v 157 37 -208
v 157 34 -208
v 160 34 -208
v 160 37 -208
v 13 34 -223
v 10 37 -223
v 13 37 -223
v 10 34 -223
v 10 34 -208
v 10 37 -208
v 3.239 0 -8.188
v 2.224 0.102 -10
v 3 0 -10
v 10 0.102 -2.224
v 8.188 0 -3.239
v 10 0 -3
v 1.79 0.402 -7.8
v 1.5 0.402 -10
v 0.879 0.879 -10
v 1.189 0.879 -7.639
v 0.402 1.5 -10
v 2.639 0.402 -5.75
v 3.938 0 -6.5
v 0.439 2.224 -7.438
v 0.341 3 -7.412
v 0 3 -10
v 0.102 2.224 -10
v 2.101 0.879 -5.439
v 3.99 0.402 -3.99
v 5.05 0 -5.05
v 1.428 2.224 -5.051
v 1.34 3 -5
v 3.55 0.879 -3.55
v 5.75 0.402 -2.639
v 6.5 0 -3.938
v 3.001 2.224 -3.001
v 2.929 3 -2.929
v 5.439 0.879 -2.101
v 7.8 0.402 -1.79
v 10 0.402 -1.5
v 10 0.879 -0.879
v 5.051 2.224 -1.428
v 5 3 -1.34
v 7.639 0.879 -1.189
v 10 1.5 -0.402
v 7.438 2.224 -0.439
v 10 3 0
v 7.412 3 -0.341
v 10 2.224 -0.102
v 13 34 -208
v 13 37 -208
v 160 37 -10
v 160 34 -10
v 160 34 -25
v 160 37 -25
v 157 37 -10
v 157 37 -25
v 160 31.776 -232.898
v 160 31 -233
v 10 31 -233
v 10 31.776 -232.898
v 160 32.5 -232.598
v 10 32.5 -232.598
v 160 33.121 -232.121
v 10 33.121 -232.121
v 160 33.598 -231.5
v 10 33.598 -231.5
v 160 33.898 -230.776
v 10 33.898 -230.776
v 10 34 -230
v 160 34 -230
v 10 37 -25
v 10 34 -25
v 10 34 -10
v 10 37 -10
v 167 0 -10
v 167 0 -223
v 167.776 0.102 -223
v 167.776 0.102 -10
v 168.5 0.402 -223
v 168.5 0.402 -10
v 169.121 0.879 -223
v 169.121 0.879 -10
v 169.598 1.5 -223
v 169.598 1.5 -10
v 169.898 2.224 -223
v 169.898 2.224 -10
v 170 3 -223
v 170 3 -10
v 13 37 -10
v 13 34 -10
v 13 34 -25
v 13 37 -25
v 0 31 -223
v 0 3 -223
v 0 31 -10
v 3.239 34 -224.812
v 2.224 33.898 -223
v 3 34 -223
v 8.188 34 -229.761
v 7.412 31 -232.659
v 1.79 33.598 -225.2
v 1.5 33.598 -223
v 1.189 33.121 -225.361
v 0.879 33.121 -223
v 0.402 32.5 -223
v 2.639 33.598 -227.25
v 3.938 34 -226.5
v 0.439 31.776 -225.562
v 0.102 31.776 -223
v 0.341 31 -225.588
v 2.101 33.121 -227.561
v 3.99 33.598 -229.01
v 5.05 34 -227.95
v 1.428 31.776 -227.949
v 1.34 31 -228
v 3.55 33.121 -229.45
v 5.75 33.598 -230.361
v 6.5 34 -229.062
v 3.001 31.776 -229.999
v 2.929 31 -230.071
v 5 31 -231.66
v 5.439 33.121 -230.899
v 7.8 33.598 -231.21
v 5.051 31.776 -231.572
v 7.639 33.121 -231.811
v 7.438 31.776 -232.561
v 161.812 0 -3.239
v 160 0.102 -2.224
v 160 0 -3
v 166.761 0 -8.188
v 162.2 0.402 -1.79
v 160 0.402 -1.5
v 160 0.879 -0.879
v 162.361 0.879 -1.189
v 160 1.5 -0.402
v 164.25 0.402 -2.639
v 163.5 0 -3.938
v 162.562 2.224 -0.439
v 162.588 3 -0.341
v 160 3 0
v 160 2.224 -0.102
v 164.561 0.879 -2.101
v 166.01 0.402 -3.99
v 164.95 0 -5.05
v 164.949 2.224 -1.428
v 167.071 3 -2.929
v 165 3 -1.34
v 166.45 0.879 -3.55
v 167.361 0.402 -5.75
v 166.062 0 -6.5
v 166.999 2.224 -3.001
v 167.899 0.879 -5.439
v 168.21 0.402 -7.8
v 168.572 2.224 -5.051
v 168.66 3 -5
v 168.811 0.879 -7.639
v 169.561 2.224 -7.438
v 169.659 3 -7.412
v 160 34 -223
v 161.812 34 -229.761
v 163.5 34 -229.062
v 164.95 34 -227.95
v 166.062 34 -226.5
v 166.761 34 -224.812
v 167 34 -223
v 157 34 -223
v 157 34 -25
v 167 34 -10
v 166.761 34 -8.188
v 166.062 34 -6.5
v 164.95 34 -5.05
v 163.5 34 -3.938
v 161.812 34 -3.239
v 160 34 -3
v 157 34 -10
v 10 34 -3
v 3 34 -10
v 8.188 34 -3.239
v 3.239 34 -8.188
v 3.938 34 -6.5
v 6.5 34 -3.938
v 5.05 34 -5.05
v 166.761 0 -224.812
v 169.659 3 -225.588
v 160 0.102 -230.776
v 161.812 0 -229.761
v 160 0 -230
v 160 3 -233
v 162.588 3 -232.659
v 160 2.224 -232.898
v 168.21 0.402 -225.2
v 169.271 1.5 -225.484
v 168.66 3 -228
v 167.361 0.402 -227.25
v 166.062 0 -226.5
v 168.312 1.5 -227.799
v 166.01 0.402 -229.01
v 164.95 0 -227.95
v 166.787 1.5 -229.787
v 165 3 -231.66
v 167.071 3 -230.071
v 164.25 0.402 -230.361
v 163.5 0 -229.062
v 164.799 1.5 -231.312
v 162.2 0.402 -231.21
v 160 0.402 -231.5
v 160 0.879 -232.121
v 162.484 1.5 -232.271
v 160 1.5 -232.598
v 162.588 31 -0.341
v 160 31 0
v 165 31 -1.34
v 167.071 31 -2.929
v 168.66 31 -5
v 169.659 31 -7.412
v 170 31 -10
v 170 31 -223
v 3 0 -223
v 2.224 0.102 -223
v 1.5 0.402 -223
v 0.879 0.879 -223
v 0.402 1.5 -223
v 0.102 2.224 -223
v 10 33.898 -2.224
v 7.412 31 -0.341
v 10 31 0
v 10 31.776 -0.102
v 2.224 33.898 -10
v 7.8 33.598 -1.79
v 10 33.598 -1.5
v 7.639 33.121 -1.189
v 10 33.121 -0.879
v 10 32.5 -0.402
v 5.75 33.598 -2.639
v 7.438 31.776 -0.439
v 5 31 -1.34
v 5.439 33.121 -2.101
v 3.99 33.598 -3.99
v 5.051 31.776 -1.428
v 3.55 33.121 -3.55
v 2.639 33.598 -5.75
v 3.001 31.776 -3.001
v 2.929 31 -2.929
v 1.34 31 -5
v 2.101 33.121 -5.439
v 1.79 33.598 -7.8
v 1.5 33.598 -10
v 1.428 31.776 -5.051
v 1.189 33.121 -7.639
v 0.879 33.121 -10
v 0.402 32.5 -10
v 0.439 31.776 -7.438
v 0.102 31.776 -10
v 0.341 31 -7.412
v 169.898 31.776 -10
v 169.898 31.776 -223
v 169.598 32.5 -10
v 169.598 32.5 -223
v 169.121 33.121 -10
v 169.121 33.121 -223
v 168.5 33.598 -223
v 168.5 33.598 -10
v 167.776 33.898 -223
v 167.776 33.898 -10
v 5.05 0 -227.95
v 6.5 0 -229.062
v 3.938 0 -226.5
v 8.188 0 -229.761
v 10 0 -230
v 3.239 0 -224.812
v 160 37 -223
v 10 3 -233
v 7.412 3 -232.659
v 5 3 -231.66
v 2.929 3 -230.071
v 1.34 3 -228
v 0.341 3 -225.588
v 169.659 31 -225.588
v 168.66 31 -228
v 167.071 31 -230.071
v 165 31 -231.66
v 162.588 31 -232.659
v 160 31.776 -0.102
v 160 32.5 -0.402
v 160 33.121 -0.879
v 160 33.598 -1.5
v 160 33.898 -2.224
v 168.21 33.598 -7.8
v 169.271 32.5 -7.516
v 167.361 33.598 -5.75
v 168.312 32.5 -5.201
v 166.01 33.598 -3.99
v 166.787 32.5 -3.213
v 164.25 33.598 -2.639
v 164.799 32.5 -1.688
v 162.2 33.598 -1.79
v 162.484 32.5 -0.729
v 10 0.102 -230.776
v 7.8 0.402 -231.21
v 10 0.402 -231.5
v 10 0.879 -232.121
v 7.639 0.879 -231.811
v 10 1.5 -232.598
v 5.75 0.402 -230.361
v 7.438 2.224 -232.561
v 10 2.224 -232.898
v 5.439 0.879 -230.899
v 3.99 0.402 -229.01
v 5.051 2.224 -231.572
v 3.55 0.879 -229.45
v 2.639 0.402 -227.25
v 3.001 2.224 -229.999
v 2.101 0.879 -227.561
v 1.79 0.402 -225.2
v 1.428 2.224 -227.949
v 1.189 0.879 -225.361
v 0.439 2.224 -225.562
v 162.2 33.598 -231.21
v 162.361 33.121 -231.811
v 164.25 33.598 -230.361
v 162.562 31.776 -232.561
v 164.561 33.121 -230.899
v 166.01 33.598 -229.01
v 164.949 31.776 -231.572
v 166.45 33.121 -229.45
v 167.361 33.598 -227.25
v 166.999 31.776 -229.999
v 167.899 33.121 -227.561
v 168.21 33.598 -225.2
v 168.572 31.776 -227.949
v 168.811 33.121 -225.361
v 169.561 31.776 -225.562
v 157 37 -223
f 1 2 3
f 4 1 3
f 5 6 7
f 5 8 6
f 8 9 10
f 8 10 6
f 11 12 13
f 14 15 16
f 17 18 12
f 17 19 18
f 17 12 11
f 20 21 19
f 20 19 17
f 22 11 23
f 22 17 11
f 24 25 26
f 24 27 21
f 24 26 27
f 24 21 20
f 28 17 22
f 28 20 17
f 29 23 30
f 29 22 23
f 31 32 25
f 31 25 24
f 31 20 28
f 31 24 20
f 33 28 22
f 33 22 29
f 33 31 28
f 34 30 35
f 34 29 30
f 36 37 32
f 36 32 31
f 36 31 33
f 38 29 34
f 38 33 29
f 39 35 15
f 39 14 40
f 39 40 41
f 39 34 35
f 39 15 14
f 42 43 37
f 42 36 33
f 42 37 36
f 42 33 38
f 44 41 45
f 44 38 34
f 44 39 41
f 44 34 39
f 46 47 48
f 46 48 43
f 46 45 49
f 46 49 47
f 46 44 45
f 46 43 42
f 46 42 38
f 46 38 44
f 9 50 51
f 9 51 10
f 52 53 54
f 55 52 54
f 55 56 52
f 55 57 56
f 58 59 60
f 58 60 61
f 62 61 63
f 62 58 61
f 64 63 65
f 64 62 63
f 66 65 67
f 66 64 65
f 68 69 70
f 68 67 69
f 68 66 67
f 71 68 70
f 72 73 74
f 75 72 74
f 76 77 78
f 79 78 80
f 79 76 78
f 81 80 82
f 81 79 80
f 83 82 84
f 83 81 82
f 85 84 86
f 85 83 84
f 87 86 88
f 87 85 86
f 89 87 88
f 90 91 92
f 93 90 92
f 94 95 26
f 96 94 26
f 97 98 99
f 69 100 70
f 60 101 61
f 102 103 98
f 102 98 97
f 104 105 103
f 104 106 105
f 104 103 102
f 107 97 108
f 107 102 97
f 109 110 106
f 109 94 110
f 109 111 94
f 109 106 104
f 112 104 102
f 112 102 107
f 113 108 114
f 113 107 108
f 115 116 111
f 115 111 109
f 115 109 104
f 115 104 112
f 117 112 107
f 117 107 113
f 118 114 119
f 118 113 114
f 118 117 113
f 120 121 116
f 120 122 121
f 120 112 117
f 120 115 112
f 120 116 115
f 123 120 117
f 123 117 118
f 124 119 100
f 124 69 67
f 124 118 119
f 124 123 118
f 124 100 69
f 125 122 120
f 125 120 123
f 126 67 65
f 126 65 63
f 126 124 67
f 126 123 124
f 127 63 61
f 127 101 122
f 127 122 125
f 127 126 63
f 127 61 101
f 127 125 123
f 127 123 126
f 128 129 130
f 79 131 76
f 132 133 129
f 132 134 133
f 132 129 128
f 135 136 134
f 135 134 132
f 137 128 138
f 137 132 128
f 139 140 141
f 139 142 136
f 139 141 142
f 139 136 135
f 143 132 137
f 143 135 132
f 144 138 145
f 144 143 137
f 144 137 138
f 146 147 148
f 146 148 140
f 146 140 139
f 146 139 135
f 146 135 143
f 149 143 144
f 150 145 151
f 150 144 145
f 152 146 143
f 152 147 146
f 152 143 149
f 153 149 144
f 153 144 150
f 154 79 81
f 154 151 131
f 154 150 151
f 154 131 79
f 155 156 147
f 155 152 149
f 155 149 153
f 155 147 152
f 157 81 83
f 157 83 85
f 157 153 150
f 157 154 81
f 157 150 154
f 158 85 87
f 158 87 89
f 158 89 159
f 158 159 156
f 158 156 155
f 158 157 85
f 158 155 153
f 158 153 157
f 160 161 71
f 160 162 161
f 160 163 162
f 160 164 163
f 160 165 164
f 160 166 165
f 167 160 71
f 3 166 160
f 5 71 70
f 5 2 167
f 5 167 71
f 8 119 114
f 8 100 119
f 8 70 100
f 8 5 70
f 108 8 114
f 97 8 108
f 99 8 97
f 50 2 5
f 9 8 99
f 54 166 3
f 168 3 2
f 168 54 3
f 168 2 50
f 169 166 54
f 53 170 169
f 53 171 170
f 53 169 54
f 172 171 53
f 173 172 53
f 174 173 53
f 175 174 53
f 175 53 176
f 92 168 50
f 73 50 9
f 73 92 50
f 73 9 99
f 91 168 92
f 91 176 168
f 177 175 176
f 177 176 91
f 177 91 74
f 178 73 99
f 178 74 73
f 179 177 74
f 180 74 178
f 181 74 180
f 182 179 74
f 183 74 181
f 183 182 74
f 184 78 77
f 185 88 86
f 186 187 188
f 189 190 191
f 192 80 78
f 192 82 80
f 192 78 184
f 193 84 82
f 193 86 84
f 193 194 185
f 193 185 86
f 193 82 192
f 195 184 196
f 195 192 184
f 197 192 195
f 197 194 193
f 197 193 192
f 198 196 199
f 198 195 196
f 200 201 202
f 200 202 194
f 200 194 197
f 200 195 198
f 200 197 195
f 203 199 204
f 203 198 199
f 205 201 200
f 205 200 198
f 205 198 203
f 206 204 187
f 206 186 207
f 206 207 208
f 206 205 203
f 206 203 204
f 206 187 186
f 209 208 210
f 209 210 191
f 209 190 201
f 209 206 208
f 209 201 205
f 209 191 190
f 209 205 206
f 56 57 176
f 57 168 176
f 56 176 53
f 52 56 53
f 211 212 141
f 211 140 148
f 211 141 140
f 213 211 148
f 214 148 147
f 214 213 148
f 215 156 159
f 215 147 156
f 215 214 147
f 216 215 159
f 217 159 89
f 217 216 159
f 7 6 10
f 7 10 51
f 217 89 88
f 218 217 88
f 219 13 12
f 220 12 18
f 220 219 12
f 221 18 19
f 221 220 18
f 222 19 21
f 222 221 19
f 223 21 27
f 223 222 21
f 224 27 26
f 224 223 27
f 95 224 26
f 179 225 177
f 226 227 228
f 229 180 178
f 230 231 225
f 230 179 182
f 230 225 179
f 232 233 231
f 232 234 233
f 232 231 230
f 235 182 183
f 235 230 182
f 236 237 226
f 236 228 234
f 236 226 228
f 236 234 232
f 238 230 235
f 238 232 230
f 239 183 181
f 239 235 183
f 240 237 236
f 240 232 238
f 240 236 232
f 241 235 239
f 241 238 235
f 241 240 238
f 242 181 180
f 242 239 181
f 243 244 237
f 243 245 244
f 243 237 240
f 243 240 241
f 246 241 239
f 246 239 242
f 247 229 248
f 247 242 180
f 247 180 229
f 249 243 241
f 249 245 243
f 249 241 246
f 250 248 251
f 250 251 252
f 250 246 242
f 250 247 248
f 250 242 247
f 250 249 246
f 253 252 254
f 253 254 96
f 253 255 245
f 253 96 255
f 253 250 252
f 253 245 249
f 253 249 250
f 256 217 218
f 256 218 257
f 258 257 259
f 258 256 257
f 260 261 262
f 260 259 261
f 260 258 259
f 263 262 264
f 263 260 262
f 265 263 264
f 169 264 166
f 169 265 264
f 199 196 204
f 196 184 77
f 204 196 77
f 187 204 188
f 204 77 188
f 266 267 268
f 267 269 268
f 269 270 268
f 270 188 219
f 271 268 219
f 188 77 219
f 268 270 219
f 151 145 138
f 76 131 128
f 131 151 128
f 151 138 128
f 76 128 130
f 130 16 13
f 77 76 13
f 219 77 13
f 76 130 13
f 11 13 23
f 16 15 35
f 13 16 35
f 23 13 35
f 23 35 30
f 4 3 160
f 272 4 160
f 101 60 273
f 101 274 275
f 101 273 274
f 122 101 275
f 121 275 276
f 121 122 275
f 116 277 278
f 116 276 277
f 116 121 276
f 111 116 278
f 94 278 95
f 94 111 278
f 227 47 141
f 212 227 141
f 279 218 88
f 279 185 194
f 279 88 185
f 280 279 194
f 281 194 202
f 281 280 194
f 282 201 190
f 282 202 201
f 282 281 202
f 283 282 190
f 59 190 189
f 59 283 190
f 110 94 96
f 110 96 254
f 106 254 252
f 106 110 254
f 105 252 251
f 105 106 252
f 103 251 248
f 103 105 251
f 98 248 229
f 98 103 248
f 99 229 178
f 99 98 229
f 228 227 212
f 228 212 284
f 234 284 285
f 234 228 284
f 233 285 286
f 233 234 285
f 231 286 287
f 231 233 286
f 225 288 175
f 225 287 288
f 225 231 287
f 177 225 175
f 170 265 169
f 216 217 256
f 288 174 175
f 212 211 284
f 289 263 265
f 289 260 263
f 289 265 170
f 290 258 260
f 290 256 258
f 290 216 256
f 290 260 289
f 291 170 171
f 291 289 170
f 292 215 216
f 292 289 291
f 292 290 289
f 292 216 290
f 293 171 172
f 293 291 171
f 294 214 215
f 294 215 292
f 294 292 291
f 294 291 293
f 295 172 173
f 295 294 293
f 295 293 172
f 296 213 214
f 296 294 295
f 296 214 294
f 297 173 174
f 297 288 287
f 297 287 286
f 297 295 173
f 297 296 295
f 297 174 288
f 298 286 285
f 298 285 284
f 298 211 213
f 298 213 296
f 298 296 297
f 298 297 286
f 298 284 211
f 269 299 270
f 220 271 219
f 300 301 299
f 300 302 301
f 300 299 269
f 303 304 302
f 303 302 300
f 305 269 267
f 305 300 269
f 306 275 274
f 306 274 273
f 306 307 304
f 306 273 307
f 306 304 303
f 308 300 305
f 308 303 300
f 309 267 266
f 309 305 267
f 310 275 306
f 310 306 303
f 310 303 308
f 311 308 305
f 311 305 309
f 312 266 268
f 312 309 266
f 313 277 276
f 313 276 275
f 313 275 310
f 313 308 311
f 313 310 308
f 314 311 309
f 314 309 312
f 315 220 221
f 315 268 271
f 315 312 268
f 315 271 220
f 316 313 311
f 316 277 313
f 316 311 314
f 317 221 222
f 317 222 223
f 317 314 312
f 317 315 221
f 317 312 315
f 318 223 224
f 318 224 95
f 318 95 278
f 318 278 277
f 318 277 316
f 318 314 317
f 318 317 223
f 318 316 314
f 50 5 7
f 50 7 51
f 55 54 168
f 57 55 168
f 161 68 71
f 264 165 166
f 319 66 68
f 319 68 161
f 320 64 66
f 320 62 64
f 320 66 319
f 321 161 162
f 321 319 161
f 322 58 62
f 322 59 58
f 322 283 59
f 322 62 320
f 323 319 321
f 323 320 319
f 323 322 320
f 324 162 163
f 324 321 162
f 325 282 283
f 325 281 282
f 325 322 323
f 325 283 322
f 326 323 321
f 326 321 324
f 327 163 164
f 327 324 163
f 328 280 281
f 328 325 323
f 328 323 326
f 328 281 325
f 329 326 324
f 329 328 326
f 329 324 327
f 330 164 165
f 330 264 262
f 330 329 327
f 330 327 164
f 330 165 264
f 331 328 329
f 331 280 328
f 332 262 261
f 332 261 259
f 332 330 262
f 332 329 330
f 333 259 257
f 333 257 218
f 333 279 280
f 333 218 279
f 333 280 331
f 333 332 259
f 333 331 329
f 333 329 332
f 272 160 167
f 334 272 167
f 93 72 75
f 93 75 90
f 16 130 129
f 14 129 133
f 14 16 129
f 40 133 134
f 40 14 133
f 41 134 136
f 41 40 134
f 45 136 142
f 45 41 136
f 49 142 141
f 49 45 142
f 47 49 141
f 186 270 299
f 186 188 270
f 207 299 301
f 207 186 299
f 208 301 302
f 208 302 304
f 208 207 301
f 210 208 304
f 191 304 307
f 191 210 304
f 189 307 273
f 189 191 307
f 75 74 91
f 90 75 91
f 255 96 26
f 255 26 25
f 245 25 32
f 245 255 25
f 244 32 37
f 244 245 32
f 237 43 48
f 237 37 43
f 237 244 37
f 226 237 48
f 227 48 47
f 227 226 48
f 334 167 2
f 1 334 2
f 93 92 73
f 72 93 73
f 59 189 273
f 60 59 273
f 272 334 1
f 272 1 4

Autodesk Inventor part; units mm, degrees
ref_plane "YZ Plane" through (0, 0, 0) normal (1, 0, 0) x (0, 1, 0)
ref_plane "XZ Plane" through (0, 0, 0) normal (0, 1, 0) x (-1, 0, 0)
ref_plane "XY Plane" through (0, 0, 0) normal (0, 0, 1) x (1, 0, 0)
sketch "スケッチ2" plane through (0, 0, 0) normal (0, 1, 0) x (-1, 0, 0)
  line L0 (0, 0) -> (-170, 0)
  line L1 (-170, 0) -> (-170, -233)
  line L2 (-170, -233) -> (0, -233)
  line L3 (0, -233) -> (0, 0)
  dimension "d0" = 170
  dimension "d1" = 233
extrude "押し出し1" add sketch "スケッチ2" along normal blind 34
fillet "フィレット1" radius 10 4 edges at (170, 17, 0) (0, 17, 0) (170, 17, -233) (0, 17, -233)
fillet "フィレット2" radius 3 16 edges at (167.0711, 34, -2.9289) (170, 34, -116.5) (167.0711, 34, -230.0711) (85, 34, -233) (2.9289, 34, -230.0711) (0, 34, -116.5) (2.9289, 34, -2.9289) (85, 34, 0) (167.0711, 0, -230.0711) (85, 0, -233) (2.9289, 0, -230.0711) (0, 0, -116.5) (2.9289, 0, -2.9289) (85, 0, 0) (167.0711, 0, -2.9289) (170, 0, -116.5)
sketch "スケッチ3" plane through (0, 34, 0) normal (0, 1, 0) x (1, 0, 0)
  line L0 (10, 10) -> (13, 10)
  line L1 (13, 10) -> (13, 25)
  line L2 (13, 25) -> (10, 25)
  line L3 (10, 25) -> (10, 10)
  line L4 (0, 223) -> (0, 10) projected
  line L5 (10, 0) -> (160, 0) projected
  line L6 (157, 10) -> (160, 10)
  line L7 (160, 10) -> (160, 25)
  line L8 (160, 25) -> (157, 25)
  line L9 (157, 25) -> (157, 10)
  line L10 (170, 10) -> (170, 223) projected
  arc A0 (170, 223) -> (160, 233) centre (160, 223) ccw projected
  line L11 (160, 223) -> (157, 223)
  line L12 (157, 223) -> (157, 208)
  line L13 (157, 208) -> (160, 208)
  line L14 (160, 208) -> (160, 223)
  arc A1 (10, 233) -> (0, 223) centre (10, 223) ccw projected
  line L15 (10, 223) -> (13, 223)
  line L16 (13, 223) -> (13, 208)
  line L17 (13, 208) -> (10, 208)
  line L18 (10, 208) -> (10, 223)
  point P0 (0, 0)
  dimension "d6" = 3
  dimension "d7" = 15
  dimension "d8" = 10
  dimension "d9" = 10
  dimension "d10" = 3
  dimension "d11" = 15
  dimension "d12" = 10
  dimension "d13" = 10
  dimension "d14" = 3
  dimension "d15" = 15
  dimension "d16" = 3
  dimension "d17" = 15
extrude "押し出し2" add sketch "スケッチ3" along normal blind 3
properties part number "box" material "ガラス"
